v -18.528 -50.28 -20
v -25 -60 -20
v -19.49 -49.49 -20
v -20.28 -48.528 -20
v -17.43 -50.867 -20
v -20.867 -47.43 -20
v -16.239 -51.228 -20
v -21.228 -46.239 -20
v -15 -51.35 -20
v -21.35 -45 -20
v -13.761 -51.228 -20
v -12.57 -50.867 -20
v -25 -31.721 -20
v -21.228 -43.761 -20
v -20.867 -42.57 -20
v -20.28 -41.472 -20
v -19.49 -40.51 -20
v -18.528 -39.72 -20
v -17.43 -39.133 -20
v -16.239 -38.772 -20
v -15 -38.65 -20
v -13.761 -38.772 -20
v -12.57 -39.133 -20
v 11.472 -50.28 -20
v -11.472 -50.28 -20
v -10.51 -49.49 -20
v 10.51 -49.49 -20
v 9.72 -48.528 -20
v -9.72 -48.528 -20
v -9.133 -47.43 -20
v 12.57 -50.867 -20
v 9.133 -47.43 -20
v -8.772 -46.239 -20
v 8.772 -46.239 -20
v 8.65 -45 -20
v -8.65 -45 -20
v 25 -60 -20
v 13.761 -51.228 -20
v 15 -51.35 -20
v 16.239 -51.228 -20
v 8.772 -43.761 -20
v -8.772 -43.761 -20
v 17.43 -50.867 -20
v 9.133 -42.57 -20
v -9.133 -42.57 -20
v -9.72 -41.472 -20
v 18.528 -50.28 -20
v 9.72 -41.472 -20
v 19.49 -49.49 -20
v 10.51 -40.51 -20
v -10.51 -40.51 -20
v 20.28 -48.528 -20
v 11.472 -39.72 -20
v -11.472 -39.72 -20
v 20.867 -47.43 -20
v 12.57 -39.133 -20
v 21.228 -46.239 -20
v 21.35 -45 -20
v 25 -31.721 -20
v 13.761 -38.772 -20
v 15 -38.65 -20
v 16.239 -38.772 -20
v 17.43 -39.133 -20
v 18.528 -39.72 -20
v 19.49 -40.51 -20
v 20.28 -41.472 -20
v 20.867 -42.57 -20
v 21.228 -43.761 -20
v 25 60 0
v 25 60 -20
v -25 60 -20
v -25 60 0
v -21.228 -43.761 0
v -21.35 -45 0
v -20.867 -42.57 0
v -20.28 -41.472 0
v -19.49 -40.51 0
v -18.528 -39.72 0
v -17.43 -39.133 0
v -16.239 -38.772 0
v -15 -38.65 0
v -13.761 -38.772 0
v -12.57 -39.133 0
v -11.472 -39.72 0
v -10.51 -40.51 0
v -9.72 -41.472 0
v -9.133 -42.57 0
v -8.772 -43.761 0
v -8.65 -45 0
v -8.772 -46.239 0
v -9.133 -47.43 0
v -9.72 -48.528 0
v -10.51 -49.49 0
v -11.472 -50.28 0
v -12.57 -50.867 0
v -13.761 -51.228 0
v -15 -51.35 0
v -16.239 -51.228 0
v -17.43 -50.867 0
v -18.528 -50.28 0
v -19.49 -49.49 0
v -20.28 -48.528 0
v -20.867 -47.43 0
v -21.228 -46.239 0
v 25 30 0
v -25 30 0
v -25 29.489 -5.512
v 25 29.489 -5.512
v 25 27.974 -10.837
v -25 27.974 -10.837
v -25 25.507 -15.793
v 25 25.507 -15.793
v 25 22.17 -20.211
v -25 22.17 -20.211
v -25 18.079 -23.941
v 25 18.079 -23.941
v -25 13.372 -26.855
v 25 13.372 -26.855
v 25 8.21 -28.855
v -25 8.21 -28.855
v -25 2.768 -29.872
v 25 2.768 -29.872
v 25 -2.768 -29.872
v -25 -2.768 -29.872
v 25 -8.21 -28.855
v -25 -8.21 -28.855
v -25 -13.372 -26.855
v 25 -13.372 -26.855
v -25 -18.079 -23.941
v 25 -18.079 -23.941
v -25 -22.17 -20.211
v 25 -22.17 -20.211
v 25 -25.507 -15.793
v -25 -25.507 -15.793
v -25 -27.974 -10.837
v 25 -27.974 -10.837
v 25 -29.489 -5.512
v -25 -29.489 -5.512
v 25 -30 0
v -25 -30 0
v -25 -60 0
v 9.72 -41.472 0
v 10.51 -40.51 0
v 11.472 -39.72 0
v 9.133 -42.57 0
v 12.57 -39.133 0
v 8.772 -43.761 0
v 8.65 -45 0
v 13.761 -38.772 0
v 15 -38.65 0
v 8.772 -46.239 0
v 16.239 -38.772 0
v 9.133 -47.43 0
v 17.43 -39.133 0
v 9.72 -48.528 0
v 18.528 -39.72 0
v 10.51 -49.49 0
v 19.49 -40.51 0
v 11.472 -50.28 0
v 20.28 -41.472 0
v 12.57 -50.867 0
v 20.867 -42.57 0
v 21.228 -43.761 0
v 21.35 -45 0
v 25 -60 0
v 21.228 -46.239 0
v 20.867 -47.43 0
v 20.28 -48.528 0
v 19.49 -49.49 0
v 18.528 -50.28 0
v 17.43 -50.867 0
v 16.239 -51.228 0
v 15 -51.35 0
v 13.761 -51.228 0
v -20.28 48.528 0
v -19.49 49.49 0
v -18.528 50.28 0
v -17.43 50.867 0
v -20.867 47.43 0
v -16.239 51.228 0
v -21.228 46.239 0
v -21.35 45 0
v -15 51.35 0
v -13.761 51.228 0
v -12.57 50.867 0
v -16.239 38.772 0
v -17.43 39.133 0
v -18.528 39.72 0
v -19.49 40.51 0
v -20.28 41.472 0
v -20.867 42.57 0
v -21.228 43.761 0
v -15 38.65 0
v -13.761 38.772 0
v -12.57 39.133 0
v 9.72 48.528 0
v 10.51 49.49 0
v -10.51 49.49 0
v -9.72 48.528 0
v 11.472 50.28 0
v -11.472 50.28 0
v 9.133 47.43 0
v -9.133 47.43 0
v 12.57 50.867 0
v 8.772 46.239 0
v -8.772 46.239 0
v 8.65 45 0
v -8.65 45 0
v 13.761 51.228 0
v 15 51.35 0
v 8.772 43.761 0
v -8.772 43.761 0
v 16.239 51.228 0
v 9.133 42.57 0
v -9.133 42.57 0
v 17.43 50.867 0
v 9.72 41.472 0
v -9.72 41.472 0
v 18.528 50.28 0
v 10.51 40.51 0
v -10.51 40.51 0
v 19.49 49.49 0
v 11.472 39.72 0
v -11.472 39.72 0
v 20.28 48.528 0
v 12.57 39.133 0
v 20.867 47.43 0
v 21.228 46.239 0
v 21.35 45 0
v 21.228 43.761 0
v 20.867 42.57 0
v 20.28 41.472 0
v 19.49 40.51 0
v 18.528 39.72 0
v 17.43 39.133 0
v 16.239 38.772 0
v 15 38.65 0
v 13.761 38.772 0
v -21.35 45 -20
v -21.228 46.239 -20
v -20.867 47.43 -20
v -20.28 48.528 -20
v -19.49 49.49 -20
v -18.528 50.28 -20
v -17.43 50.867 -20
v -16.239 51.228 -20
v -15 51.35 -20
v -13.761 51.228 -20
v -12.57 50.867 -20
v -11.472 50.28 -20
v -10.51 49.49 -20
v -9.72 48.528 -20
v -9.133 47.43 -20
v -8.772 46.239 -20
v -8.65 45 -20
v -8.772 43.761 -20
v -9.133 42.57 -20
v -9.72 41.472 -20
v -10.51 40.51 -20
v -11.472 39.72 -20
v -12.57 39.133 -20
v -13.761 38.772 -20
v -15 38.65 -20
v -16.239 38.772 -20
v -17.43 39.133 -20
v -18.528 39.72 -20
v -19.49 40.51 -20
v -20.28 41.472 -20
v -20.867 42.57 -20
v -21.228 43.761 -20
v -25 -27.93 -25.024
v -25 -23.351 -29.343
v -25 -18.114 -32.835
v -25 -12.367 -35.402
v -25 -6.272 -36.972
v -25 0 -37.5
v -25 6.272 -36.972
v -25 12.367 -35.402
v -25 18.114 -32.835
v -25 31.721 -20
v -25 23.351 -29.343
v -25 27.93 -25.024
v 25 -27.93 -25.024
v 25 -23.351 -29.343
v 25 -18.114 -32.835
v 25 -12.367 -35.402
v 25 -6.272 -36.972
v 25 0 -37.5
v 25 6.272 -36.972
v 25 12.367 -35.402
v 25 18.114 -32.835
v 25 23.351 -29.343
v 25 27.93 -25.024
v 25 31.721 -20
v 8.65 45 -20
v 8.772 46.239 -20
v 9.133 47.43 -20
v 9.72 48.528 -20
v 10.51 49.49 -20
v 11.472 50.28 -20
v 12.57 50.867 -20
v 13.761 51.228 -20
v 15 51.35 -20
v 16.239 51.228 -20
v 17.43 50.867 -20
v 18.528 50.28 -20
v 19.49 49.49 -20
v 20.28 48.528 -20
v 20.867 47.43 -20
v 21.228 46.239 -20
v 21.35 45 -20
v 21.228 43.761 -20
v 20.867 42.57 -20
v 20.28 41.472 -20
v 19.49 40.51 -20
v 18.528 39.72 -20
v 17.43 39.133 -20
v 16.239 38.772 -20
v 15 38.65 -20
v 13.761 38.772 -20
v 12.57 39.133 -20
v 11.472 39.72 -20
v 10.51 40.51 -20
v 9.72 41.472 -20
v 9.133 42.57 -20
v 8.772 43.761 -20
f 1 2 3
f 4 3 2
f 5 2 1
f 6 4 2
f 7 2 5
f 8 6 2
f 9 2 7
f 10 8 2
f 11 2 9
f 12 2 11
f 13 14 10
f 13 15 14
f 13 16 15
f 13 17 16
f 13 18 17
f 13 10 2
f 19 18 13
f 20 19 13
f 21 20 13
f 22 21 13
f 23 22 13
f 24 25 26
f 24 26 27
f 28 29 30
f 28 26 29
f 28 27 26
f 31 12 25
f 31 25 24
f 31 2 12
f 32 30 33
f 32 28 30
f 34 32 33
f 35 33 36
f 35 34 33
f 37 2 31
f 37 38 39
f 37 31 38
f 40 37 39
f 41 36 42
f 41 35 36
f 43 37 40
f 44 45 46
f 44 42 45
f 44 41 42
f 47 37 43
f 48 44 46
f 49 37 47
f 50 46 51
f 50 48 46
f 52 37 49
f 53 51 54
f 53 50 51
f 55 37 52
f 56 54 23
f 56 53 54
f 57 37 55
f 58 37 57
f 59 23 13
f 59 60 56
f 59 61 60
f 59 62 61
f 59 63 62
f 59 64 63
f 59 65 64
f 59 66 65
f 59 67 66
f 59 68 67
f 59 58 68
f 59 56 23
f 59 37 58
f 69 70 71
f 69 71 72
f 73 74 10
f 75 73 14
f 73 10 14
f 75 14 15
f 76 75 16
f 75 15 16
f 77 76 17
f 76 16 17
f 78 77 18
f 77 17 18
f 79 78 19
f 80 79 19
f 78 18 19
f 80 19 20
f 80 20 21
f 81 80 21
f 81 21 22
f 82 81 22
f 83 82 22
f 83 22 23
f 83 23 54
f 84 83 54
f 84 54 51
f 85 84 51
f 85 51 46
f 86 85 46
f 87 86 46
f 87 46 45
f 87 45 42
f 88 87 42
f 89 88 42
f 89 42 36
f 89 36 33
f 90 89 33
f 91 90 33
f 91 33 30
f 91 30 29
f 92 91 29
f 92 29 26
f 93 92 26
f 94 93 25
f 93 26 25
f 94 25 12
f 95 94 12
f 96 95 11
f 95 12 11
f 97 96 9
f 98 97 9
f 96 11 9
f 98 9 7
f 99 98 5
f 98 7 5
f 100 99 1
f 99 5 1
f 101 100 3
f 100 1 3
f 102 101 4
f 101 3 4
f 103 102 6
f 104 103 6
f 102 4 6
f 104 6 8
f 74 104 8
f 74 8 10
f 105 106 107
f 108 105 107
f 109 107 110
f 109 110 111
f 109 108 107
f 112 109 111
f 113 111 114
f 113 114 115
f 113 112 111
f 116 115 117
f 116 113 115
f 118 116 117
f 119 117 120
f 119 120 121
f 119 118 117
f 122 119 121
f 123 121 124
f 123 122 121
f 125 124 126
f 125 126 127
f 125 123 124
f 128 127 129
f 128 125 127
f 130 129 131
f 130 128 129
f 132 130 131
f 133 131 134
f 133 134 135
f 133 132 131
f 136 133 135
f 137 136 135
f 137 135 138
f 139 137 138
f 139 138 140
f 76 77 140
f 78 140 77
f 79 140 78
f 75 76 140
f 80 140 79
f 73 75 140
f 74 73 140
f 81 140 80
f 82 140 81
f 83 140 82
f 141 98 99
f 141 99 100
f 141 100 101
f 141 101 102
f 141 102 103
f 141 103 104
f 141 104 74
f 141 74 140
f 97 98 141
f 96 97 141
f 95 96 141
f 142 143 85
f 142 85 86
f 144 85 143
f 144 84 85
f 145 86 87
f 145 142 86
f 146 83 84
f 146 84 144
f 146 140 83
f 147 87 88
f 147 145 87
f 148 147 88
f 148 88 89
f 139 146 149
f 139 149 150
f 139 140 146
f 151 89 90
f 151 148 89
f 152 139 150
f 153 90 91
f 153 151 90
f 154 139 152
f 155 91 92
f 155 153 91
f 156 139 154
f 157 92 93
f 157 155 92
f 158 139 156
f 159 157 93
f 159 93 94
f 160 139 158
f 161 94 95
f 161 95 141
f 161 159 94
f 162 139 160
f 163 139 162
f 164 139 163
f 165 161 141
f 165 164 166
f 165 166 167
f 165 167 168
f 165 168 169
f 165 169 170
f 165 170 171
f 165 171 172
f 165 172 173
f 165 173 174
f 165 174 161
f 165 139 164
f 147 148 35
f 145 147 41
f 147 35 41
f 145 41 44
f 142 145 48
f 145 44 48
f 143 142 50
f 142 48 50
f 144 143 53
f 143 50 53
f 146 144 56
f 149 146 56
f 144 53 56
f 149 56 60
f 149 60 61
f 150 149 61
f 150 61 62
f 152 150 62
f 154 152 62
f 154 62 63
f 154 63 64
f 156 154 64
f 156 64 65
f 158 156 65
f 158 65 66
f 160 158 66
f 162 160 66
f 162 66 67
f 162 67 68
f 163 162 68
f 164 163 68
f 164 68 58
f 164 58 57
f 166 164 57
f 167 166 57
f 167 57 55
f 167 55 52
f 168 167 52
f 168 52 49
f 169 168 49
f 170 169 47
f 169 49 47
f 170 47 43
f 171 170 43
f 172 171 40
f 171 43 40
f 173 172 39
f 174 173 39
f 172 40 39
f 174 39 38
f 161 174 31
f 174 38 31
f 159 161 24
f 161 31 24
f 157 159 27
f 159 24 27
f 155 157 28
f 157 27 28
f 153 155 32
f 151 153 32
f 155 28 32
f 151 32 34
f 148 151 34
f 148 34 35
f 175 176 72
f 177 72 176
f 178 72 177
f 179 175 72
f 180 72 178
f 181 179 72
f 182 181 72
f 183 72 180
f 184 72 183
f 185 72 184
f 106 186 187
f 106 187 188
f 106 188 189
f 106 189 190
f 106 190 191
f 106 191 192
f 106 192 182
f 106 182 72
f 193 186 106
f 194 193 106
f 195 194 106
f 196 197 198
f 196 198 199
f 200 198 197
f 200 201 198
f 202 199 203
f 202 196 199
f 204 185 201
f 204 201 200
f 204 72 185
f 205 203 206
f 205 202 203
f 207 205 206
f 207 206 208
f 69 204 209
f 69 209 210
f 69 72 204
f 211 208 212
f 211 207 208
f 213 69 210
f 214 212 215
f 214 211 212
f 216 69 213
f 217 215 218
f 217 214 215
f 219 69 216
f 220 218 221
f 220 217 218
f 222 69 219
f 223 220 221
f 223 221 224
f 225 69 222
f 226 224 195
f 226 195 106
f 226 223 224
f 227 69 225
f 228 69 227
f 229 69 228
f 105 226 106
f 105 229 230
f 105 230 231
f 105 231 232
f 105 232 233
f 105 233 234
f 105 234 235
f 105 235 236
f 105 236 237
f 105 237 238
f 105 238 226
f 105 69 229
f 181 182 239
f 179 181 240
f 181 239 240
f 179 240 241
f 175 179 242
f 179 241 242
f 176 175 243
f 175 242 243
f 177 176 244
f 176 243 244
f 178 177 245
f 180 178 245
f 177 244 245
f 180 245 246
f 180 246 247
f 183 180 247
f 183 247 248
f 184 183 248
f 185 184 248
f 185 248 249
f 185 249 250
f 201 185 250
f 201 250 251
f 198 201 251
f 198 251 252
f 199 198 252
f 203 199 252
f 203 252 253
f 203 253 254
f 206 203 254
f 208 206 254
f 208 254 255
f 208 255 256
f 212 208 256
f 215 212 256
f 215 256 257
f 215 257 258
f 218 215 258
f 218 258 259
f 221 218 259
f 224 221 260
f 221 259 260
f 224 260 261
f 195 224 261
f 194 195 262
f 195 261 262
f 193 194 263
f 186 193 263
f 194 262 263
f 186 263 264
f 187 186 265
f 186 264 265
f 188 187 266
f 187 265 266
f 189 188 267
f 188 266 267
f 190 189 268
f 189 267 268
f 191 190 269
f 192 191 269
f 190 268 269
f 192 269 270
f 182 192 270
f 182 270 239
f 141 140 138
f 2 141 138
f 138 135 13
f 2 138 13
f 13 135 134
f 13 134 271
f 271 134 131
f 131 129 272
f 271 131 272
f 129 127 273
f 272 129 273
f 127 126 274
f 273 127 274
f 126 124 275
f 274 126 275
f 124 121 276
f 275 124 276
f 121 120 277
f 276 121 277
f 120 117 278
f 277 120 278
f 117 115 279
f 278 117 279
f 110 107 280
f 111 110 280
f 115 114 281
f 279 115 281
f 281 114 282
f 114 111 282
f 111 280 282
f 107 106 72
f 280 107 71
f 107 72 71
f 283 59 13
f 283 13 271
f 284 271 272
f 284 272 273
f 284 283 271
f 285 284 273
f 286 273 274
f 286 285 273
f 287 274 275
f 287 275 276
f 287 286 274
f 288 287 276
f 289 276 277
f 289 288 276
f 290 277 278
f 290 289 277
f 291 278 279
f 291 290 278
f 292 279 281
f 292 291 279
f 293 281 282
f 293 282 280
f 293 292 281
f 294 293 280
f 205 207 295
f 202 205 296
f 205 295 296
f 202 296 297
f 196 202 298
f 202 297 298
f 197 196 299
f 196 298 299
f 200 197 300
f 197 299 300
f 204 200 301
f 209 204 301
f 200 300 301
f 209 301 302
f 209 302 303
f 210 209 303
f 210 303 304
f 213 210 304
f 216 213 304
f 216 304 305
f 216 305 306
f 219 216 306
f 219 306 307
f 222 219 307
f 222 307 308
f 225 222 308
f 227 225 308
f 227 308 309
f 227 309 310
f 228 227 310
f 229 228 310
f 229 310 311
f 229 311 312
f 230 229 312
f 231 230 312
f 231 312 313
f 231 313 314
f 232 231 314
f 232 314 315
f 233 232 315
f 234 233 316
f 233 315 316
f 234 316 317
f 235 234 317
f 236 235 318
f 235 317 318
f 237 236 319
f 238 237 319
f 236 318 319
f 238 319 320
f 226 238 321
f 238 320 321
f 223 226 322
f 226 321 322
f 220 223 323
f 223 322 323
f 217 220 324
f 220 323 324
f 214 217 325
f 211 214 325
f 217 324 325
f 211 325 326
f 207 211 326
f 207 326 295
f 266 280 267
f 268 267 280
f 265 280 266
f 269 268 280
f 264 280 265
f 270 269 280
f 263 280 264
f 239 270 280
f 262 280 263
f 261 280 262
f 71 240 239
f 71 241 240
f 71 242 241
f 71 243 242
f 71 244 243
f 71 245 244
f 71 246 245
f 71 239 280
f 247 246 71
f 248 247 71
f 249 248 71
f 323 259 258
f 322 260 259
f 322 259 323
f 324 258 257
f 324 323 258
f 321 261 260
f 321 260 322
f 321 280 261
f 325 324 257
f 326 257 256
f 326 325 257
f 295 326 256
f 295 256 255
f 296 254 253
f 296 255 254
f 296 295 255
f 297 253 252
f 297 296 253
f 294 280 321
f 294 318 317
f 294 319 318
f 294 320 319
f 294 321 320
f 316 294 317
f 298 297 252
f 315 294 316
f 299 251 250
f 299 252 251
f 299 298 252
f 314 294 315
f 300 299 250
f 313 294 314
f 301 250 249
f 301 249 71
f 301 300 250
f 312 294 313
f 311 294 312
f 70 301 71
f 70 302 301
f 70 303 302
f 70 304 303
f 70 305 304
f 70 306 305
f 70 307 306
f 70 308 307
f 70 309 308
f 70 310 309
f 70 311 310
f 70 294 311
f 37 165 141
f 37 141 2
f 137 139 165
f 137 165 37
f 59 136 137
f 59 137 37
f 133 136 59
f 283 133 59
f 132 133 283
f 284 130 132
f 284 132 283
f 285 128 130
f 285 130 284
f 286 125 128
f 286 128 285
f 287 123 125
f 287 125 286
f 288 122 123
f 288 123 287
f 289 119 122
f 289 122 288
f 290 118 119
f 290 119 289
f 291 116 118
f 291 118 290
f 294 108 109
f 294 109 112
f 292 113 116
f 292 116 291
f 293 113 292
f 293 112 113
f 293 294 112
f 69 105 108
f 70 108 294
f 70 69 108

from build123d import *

# Parameters (mm, degrees)
BOSS_EXTRUDE1_DEPTH        = 25
F_1_2_0_5_DIAMETER_HOLE1_D = 12.7


with BuildPart() as part:
    # Sketch1 → Boss-Extrude1 (new, symmetric)
    with BuildSketch(Plane(origin=(0, 0, 0), x_dir=(0, 0, -1), z_dir=(1, 0, 0))):
        with BuildLine():
            Line((0, -30), (0, -60))
            Line((0, -60), (20, -60))
            Line((20, -60), (20, -31.721443851))
            ThreePointArc((20, -31.721443851), (37.5, 0), (20, 31.721443851))
            Line((20, 31.721443851), (20, 60))
            Line((20, 60), (0, 60))
            Line((0, 60), (0, 30))
            ThreePointArc((0, 30), (30, 0), (0, -30))
        make_face()
    extrude(amount=BOSS_EXTRUDE1_DEPTH, both=True)

    # 1/2 (0.5) Diameter Hole1 (through all)
    with Locations(Plane.XY):
        with Locations((-15, 45), (15, 45), (15, -45), (-15, -45)):
            Hole(F_1_2_0_5_DIAMETER_HOLE1_D / 2)


solid = part.part
